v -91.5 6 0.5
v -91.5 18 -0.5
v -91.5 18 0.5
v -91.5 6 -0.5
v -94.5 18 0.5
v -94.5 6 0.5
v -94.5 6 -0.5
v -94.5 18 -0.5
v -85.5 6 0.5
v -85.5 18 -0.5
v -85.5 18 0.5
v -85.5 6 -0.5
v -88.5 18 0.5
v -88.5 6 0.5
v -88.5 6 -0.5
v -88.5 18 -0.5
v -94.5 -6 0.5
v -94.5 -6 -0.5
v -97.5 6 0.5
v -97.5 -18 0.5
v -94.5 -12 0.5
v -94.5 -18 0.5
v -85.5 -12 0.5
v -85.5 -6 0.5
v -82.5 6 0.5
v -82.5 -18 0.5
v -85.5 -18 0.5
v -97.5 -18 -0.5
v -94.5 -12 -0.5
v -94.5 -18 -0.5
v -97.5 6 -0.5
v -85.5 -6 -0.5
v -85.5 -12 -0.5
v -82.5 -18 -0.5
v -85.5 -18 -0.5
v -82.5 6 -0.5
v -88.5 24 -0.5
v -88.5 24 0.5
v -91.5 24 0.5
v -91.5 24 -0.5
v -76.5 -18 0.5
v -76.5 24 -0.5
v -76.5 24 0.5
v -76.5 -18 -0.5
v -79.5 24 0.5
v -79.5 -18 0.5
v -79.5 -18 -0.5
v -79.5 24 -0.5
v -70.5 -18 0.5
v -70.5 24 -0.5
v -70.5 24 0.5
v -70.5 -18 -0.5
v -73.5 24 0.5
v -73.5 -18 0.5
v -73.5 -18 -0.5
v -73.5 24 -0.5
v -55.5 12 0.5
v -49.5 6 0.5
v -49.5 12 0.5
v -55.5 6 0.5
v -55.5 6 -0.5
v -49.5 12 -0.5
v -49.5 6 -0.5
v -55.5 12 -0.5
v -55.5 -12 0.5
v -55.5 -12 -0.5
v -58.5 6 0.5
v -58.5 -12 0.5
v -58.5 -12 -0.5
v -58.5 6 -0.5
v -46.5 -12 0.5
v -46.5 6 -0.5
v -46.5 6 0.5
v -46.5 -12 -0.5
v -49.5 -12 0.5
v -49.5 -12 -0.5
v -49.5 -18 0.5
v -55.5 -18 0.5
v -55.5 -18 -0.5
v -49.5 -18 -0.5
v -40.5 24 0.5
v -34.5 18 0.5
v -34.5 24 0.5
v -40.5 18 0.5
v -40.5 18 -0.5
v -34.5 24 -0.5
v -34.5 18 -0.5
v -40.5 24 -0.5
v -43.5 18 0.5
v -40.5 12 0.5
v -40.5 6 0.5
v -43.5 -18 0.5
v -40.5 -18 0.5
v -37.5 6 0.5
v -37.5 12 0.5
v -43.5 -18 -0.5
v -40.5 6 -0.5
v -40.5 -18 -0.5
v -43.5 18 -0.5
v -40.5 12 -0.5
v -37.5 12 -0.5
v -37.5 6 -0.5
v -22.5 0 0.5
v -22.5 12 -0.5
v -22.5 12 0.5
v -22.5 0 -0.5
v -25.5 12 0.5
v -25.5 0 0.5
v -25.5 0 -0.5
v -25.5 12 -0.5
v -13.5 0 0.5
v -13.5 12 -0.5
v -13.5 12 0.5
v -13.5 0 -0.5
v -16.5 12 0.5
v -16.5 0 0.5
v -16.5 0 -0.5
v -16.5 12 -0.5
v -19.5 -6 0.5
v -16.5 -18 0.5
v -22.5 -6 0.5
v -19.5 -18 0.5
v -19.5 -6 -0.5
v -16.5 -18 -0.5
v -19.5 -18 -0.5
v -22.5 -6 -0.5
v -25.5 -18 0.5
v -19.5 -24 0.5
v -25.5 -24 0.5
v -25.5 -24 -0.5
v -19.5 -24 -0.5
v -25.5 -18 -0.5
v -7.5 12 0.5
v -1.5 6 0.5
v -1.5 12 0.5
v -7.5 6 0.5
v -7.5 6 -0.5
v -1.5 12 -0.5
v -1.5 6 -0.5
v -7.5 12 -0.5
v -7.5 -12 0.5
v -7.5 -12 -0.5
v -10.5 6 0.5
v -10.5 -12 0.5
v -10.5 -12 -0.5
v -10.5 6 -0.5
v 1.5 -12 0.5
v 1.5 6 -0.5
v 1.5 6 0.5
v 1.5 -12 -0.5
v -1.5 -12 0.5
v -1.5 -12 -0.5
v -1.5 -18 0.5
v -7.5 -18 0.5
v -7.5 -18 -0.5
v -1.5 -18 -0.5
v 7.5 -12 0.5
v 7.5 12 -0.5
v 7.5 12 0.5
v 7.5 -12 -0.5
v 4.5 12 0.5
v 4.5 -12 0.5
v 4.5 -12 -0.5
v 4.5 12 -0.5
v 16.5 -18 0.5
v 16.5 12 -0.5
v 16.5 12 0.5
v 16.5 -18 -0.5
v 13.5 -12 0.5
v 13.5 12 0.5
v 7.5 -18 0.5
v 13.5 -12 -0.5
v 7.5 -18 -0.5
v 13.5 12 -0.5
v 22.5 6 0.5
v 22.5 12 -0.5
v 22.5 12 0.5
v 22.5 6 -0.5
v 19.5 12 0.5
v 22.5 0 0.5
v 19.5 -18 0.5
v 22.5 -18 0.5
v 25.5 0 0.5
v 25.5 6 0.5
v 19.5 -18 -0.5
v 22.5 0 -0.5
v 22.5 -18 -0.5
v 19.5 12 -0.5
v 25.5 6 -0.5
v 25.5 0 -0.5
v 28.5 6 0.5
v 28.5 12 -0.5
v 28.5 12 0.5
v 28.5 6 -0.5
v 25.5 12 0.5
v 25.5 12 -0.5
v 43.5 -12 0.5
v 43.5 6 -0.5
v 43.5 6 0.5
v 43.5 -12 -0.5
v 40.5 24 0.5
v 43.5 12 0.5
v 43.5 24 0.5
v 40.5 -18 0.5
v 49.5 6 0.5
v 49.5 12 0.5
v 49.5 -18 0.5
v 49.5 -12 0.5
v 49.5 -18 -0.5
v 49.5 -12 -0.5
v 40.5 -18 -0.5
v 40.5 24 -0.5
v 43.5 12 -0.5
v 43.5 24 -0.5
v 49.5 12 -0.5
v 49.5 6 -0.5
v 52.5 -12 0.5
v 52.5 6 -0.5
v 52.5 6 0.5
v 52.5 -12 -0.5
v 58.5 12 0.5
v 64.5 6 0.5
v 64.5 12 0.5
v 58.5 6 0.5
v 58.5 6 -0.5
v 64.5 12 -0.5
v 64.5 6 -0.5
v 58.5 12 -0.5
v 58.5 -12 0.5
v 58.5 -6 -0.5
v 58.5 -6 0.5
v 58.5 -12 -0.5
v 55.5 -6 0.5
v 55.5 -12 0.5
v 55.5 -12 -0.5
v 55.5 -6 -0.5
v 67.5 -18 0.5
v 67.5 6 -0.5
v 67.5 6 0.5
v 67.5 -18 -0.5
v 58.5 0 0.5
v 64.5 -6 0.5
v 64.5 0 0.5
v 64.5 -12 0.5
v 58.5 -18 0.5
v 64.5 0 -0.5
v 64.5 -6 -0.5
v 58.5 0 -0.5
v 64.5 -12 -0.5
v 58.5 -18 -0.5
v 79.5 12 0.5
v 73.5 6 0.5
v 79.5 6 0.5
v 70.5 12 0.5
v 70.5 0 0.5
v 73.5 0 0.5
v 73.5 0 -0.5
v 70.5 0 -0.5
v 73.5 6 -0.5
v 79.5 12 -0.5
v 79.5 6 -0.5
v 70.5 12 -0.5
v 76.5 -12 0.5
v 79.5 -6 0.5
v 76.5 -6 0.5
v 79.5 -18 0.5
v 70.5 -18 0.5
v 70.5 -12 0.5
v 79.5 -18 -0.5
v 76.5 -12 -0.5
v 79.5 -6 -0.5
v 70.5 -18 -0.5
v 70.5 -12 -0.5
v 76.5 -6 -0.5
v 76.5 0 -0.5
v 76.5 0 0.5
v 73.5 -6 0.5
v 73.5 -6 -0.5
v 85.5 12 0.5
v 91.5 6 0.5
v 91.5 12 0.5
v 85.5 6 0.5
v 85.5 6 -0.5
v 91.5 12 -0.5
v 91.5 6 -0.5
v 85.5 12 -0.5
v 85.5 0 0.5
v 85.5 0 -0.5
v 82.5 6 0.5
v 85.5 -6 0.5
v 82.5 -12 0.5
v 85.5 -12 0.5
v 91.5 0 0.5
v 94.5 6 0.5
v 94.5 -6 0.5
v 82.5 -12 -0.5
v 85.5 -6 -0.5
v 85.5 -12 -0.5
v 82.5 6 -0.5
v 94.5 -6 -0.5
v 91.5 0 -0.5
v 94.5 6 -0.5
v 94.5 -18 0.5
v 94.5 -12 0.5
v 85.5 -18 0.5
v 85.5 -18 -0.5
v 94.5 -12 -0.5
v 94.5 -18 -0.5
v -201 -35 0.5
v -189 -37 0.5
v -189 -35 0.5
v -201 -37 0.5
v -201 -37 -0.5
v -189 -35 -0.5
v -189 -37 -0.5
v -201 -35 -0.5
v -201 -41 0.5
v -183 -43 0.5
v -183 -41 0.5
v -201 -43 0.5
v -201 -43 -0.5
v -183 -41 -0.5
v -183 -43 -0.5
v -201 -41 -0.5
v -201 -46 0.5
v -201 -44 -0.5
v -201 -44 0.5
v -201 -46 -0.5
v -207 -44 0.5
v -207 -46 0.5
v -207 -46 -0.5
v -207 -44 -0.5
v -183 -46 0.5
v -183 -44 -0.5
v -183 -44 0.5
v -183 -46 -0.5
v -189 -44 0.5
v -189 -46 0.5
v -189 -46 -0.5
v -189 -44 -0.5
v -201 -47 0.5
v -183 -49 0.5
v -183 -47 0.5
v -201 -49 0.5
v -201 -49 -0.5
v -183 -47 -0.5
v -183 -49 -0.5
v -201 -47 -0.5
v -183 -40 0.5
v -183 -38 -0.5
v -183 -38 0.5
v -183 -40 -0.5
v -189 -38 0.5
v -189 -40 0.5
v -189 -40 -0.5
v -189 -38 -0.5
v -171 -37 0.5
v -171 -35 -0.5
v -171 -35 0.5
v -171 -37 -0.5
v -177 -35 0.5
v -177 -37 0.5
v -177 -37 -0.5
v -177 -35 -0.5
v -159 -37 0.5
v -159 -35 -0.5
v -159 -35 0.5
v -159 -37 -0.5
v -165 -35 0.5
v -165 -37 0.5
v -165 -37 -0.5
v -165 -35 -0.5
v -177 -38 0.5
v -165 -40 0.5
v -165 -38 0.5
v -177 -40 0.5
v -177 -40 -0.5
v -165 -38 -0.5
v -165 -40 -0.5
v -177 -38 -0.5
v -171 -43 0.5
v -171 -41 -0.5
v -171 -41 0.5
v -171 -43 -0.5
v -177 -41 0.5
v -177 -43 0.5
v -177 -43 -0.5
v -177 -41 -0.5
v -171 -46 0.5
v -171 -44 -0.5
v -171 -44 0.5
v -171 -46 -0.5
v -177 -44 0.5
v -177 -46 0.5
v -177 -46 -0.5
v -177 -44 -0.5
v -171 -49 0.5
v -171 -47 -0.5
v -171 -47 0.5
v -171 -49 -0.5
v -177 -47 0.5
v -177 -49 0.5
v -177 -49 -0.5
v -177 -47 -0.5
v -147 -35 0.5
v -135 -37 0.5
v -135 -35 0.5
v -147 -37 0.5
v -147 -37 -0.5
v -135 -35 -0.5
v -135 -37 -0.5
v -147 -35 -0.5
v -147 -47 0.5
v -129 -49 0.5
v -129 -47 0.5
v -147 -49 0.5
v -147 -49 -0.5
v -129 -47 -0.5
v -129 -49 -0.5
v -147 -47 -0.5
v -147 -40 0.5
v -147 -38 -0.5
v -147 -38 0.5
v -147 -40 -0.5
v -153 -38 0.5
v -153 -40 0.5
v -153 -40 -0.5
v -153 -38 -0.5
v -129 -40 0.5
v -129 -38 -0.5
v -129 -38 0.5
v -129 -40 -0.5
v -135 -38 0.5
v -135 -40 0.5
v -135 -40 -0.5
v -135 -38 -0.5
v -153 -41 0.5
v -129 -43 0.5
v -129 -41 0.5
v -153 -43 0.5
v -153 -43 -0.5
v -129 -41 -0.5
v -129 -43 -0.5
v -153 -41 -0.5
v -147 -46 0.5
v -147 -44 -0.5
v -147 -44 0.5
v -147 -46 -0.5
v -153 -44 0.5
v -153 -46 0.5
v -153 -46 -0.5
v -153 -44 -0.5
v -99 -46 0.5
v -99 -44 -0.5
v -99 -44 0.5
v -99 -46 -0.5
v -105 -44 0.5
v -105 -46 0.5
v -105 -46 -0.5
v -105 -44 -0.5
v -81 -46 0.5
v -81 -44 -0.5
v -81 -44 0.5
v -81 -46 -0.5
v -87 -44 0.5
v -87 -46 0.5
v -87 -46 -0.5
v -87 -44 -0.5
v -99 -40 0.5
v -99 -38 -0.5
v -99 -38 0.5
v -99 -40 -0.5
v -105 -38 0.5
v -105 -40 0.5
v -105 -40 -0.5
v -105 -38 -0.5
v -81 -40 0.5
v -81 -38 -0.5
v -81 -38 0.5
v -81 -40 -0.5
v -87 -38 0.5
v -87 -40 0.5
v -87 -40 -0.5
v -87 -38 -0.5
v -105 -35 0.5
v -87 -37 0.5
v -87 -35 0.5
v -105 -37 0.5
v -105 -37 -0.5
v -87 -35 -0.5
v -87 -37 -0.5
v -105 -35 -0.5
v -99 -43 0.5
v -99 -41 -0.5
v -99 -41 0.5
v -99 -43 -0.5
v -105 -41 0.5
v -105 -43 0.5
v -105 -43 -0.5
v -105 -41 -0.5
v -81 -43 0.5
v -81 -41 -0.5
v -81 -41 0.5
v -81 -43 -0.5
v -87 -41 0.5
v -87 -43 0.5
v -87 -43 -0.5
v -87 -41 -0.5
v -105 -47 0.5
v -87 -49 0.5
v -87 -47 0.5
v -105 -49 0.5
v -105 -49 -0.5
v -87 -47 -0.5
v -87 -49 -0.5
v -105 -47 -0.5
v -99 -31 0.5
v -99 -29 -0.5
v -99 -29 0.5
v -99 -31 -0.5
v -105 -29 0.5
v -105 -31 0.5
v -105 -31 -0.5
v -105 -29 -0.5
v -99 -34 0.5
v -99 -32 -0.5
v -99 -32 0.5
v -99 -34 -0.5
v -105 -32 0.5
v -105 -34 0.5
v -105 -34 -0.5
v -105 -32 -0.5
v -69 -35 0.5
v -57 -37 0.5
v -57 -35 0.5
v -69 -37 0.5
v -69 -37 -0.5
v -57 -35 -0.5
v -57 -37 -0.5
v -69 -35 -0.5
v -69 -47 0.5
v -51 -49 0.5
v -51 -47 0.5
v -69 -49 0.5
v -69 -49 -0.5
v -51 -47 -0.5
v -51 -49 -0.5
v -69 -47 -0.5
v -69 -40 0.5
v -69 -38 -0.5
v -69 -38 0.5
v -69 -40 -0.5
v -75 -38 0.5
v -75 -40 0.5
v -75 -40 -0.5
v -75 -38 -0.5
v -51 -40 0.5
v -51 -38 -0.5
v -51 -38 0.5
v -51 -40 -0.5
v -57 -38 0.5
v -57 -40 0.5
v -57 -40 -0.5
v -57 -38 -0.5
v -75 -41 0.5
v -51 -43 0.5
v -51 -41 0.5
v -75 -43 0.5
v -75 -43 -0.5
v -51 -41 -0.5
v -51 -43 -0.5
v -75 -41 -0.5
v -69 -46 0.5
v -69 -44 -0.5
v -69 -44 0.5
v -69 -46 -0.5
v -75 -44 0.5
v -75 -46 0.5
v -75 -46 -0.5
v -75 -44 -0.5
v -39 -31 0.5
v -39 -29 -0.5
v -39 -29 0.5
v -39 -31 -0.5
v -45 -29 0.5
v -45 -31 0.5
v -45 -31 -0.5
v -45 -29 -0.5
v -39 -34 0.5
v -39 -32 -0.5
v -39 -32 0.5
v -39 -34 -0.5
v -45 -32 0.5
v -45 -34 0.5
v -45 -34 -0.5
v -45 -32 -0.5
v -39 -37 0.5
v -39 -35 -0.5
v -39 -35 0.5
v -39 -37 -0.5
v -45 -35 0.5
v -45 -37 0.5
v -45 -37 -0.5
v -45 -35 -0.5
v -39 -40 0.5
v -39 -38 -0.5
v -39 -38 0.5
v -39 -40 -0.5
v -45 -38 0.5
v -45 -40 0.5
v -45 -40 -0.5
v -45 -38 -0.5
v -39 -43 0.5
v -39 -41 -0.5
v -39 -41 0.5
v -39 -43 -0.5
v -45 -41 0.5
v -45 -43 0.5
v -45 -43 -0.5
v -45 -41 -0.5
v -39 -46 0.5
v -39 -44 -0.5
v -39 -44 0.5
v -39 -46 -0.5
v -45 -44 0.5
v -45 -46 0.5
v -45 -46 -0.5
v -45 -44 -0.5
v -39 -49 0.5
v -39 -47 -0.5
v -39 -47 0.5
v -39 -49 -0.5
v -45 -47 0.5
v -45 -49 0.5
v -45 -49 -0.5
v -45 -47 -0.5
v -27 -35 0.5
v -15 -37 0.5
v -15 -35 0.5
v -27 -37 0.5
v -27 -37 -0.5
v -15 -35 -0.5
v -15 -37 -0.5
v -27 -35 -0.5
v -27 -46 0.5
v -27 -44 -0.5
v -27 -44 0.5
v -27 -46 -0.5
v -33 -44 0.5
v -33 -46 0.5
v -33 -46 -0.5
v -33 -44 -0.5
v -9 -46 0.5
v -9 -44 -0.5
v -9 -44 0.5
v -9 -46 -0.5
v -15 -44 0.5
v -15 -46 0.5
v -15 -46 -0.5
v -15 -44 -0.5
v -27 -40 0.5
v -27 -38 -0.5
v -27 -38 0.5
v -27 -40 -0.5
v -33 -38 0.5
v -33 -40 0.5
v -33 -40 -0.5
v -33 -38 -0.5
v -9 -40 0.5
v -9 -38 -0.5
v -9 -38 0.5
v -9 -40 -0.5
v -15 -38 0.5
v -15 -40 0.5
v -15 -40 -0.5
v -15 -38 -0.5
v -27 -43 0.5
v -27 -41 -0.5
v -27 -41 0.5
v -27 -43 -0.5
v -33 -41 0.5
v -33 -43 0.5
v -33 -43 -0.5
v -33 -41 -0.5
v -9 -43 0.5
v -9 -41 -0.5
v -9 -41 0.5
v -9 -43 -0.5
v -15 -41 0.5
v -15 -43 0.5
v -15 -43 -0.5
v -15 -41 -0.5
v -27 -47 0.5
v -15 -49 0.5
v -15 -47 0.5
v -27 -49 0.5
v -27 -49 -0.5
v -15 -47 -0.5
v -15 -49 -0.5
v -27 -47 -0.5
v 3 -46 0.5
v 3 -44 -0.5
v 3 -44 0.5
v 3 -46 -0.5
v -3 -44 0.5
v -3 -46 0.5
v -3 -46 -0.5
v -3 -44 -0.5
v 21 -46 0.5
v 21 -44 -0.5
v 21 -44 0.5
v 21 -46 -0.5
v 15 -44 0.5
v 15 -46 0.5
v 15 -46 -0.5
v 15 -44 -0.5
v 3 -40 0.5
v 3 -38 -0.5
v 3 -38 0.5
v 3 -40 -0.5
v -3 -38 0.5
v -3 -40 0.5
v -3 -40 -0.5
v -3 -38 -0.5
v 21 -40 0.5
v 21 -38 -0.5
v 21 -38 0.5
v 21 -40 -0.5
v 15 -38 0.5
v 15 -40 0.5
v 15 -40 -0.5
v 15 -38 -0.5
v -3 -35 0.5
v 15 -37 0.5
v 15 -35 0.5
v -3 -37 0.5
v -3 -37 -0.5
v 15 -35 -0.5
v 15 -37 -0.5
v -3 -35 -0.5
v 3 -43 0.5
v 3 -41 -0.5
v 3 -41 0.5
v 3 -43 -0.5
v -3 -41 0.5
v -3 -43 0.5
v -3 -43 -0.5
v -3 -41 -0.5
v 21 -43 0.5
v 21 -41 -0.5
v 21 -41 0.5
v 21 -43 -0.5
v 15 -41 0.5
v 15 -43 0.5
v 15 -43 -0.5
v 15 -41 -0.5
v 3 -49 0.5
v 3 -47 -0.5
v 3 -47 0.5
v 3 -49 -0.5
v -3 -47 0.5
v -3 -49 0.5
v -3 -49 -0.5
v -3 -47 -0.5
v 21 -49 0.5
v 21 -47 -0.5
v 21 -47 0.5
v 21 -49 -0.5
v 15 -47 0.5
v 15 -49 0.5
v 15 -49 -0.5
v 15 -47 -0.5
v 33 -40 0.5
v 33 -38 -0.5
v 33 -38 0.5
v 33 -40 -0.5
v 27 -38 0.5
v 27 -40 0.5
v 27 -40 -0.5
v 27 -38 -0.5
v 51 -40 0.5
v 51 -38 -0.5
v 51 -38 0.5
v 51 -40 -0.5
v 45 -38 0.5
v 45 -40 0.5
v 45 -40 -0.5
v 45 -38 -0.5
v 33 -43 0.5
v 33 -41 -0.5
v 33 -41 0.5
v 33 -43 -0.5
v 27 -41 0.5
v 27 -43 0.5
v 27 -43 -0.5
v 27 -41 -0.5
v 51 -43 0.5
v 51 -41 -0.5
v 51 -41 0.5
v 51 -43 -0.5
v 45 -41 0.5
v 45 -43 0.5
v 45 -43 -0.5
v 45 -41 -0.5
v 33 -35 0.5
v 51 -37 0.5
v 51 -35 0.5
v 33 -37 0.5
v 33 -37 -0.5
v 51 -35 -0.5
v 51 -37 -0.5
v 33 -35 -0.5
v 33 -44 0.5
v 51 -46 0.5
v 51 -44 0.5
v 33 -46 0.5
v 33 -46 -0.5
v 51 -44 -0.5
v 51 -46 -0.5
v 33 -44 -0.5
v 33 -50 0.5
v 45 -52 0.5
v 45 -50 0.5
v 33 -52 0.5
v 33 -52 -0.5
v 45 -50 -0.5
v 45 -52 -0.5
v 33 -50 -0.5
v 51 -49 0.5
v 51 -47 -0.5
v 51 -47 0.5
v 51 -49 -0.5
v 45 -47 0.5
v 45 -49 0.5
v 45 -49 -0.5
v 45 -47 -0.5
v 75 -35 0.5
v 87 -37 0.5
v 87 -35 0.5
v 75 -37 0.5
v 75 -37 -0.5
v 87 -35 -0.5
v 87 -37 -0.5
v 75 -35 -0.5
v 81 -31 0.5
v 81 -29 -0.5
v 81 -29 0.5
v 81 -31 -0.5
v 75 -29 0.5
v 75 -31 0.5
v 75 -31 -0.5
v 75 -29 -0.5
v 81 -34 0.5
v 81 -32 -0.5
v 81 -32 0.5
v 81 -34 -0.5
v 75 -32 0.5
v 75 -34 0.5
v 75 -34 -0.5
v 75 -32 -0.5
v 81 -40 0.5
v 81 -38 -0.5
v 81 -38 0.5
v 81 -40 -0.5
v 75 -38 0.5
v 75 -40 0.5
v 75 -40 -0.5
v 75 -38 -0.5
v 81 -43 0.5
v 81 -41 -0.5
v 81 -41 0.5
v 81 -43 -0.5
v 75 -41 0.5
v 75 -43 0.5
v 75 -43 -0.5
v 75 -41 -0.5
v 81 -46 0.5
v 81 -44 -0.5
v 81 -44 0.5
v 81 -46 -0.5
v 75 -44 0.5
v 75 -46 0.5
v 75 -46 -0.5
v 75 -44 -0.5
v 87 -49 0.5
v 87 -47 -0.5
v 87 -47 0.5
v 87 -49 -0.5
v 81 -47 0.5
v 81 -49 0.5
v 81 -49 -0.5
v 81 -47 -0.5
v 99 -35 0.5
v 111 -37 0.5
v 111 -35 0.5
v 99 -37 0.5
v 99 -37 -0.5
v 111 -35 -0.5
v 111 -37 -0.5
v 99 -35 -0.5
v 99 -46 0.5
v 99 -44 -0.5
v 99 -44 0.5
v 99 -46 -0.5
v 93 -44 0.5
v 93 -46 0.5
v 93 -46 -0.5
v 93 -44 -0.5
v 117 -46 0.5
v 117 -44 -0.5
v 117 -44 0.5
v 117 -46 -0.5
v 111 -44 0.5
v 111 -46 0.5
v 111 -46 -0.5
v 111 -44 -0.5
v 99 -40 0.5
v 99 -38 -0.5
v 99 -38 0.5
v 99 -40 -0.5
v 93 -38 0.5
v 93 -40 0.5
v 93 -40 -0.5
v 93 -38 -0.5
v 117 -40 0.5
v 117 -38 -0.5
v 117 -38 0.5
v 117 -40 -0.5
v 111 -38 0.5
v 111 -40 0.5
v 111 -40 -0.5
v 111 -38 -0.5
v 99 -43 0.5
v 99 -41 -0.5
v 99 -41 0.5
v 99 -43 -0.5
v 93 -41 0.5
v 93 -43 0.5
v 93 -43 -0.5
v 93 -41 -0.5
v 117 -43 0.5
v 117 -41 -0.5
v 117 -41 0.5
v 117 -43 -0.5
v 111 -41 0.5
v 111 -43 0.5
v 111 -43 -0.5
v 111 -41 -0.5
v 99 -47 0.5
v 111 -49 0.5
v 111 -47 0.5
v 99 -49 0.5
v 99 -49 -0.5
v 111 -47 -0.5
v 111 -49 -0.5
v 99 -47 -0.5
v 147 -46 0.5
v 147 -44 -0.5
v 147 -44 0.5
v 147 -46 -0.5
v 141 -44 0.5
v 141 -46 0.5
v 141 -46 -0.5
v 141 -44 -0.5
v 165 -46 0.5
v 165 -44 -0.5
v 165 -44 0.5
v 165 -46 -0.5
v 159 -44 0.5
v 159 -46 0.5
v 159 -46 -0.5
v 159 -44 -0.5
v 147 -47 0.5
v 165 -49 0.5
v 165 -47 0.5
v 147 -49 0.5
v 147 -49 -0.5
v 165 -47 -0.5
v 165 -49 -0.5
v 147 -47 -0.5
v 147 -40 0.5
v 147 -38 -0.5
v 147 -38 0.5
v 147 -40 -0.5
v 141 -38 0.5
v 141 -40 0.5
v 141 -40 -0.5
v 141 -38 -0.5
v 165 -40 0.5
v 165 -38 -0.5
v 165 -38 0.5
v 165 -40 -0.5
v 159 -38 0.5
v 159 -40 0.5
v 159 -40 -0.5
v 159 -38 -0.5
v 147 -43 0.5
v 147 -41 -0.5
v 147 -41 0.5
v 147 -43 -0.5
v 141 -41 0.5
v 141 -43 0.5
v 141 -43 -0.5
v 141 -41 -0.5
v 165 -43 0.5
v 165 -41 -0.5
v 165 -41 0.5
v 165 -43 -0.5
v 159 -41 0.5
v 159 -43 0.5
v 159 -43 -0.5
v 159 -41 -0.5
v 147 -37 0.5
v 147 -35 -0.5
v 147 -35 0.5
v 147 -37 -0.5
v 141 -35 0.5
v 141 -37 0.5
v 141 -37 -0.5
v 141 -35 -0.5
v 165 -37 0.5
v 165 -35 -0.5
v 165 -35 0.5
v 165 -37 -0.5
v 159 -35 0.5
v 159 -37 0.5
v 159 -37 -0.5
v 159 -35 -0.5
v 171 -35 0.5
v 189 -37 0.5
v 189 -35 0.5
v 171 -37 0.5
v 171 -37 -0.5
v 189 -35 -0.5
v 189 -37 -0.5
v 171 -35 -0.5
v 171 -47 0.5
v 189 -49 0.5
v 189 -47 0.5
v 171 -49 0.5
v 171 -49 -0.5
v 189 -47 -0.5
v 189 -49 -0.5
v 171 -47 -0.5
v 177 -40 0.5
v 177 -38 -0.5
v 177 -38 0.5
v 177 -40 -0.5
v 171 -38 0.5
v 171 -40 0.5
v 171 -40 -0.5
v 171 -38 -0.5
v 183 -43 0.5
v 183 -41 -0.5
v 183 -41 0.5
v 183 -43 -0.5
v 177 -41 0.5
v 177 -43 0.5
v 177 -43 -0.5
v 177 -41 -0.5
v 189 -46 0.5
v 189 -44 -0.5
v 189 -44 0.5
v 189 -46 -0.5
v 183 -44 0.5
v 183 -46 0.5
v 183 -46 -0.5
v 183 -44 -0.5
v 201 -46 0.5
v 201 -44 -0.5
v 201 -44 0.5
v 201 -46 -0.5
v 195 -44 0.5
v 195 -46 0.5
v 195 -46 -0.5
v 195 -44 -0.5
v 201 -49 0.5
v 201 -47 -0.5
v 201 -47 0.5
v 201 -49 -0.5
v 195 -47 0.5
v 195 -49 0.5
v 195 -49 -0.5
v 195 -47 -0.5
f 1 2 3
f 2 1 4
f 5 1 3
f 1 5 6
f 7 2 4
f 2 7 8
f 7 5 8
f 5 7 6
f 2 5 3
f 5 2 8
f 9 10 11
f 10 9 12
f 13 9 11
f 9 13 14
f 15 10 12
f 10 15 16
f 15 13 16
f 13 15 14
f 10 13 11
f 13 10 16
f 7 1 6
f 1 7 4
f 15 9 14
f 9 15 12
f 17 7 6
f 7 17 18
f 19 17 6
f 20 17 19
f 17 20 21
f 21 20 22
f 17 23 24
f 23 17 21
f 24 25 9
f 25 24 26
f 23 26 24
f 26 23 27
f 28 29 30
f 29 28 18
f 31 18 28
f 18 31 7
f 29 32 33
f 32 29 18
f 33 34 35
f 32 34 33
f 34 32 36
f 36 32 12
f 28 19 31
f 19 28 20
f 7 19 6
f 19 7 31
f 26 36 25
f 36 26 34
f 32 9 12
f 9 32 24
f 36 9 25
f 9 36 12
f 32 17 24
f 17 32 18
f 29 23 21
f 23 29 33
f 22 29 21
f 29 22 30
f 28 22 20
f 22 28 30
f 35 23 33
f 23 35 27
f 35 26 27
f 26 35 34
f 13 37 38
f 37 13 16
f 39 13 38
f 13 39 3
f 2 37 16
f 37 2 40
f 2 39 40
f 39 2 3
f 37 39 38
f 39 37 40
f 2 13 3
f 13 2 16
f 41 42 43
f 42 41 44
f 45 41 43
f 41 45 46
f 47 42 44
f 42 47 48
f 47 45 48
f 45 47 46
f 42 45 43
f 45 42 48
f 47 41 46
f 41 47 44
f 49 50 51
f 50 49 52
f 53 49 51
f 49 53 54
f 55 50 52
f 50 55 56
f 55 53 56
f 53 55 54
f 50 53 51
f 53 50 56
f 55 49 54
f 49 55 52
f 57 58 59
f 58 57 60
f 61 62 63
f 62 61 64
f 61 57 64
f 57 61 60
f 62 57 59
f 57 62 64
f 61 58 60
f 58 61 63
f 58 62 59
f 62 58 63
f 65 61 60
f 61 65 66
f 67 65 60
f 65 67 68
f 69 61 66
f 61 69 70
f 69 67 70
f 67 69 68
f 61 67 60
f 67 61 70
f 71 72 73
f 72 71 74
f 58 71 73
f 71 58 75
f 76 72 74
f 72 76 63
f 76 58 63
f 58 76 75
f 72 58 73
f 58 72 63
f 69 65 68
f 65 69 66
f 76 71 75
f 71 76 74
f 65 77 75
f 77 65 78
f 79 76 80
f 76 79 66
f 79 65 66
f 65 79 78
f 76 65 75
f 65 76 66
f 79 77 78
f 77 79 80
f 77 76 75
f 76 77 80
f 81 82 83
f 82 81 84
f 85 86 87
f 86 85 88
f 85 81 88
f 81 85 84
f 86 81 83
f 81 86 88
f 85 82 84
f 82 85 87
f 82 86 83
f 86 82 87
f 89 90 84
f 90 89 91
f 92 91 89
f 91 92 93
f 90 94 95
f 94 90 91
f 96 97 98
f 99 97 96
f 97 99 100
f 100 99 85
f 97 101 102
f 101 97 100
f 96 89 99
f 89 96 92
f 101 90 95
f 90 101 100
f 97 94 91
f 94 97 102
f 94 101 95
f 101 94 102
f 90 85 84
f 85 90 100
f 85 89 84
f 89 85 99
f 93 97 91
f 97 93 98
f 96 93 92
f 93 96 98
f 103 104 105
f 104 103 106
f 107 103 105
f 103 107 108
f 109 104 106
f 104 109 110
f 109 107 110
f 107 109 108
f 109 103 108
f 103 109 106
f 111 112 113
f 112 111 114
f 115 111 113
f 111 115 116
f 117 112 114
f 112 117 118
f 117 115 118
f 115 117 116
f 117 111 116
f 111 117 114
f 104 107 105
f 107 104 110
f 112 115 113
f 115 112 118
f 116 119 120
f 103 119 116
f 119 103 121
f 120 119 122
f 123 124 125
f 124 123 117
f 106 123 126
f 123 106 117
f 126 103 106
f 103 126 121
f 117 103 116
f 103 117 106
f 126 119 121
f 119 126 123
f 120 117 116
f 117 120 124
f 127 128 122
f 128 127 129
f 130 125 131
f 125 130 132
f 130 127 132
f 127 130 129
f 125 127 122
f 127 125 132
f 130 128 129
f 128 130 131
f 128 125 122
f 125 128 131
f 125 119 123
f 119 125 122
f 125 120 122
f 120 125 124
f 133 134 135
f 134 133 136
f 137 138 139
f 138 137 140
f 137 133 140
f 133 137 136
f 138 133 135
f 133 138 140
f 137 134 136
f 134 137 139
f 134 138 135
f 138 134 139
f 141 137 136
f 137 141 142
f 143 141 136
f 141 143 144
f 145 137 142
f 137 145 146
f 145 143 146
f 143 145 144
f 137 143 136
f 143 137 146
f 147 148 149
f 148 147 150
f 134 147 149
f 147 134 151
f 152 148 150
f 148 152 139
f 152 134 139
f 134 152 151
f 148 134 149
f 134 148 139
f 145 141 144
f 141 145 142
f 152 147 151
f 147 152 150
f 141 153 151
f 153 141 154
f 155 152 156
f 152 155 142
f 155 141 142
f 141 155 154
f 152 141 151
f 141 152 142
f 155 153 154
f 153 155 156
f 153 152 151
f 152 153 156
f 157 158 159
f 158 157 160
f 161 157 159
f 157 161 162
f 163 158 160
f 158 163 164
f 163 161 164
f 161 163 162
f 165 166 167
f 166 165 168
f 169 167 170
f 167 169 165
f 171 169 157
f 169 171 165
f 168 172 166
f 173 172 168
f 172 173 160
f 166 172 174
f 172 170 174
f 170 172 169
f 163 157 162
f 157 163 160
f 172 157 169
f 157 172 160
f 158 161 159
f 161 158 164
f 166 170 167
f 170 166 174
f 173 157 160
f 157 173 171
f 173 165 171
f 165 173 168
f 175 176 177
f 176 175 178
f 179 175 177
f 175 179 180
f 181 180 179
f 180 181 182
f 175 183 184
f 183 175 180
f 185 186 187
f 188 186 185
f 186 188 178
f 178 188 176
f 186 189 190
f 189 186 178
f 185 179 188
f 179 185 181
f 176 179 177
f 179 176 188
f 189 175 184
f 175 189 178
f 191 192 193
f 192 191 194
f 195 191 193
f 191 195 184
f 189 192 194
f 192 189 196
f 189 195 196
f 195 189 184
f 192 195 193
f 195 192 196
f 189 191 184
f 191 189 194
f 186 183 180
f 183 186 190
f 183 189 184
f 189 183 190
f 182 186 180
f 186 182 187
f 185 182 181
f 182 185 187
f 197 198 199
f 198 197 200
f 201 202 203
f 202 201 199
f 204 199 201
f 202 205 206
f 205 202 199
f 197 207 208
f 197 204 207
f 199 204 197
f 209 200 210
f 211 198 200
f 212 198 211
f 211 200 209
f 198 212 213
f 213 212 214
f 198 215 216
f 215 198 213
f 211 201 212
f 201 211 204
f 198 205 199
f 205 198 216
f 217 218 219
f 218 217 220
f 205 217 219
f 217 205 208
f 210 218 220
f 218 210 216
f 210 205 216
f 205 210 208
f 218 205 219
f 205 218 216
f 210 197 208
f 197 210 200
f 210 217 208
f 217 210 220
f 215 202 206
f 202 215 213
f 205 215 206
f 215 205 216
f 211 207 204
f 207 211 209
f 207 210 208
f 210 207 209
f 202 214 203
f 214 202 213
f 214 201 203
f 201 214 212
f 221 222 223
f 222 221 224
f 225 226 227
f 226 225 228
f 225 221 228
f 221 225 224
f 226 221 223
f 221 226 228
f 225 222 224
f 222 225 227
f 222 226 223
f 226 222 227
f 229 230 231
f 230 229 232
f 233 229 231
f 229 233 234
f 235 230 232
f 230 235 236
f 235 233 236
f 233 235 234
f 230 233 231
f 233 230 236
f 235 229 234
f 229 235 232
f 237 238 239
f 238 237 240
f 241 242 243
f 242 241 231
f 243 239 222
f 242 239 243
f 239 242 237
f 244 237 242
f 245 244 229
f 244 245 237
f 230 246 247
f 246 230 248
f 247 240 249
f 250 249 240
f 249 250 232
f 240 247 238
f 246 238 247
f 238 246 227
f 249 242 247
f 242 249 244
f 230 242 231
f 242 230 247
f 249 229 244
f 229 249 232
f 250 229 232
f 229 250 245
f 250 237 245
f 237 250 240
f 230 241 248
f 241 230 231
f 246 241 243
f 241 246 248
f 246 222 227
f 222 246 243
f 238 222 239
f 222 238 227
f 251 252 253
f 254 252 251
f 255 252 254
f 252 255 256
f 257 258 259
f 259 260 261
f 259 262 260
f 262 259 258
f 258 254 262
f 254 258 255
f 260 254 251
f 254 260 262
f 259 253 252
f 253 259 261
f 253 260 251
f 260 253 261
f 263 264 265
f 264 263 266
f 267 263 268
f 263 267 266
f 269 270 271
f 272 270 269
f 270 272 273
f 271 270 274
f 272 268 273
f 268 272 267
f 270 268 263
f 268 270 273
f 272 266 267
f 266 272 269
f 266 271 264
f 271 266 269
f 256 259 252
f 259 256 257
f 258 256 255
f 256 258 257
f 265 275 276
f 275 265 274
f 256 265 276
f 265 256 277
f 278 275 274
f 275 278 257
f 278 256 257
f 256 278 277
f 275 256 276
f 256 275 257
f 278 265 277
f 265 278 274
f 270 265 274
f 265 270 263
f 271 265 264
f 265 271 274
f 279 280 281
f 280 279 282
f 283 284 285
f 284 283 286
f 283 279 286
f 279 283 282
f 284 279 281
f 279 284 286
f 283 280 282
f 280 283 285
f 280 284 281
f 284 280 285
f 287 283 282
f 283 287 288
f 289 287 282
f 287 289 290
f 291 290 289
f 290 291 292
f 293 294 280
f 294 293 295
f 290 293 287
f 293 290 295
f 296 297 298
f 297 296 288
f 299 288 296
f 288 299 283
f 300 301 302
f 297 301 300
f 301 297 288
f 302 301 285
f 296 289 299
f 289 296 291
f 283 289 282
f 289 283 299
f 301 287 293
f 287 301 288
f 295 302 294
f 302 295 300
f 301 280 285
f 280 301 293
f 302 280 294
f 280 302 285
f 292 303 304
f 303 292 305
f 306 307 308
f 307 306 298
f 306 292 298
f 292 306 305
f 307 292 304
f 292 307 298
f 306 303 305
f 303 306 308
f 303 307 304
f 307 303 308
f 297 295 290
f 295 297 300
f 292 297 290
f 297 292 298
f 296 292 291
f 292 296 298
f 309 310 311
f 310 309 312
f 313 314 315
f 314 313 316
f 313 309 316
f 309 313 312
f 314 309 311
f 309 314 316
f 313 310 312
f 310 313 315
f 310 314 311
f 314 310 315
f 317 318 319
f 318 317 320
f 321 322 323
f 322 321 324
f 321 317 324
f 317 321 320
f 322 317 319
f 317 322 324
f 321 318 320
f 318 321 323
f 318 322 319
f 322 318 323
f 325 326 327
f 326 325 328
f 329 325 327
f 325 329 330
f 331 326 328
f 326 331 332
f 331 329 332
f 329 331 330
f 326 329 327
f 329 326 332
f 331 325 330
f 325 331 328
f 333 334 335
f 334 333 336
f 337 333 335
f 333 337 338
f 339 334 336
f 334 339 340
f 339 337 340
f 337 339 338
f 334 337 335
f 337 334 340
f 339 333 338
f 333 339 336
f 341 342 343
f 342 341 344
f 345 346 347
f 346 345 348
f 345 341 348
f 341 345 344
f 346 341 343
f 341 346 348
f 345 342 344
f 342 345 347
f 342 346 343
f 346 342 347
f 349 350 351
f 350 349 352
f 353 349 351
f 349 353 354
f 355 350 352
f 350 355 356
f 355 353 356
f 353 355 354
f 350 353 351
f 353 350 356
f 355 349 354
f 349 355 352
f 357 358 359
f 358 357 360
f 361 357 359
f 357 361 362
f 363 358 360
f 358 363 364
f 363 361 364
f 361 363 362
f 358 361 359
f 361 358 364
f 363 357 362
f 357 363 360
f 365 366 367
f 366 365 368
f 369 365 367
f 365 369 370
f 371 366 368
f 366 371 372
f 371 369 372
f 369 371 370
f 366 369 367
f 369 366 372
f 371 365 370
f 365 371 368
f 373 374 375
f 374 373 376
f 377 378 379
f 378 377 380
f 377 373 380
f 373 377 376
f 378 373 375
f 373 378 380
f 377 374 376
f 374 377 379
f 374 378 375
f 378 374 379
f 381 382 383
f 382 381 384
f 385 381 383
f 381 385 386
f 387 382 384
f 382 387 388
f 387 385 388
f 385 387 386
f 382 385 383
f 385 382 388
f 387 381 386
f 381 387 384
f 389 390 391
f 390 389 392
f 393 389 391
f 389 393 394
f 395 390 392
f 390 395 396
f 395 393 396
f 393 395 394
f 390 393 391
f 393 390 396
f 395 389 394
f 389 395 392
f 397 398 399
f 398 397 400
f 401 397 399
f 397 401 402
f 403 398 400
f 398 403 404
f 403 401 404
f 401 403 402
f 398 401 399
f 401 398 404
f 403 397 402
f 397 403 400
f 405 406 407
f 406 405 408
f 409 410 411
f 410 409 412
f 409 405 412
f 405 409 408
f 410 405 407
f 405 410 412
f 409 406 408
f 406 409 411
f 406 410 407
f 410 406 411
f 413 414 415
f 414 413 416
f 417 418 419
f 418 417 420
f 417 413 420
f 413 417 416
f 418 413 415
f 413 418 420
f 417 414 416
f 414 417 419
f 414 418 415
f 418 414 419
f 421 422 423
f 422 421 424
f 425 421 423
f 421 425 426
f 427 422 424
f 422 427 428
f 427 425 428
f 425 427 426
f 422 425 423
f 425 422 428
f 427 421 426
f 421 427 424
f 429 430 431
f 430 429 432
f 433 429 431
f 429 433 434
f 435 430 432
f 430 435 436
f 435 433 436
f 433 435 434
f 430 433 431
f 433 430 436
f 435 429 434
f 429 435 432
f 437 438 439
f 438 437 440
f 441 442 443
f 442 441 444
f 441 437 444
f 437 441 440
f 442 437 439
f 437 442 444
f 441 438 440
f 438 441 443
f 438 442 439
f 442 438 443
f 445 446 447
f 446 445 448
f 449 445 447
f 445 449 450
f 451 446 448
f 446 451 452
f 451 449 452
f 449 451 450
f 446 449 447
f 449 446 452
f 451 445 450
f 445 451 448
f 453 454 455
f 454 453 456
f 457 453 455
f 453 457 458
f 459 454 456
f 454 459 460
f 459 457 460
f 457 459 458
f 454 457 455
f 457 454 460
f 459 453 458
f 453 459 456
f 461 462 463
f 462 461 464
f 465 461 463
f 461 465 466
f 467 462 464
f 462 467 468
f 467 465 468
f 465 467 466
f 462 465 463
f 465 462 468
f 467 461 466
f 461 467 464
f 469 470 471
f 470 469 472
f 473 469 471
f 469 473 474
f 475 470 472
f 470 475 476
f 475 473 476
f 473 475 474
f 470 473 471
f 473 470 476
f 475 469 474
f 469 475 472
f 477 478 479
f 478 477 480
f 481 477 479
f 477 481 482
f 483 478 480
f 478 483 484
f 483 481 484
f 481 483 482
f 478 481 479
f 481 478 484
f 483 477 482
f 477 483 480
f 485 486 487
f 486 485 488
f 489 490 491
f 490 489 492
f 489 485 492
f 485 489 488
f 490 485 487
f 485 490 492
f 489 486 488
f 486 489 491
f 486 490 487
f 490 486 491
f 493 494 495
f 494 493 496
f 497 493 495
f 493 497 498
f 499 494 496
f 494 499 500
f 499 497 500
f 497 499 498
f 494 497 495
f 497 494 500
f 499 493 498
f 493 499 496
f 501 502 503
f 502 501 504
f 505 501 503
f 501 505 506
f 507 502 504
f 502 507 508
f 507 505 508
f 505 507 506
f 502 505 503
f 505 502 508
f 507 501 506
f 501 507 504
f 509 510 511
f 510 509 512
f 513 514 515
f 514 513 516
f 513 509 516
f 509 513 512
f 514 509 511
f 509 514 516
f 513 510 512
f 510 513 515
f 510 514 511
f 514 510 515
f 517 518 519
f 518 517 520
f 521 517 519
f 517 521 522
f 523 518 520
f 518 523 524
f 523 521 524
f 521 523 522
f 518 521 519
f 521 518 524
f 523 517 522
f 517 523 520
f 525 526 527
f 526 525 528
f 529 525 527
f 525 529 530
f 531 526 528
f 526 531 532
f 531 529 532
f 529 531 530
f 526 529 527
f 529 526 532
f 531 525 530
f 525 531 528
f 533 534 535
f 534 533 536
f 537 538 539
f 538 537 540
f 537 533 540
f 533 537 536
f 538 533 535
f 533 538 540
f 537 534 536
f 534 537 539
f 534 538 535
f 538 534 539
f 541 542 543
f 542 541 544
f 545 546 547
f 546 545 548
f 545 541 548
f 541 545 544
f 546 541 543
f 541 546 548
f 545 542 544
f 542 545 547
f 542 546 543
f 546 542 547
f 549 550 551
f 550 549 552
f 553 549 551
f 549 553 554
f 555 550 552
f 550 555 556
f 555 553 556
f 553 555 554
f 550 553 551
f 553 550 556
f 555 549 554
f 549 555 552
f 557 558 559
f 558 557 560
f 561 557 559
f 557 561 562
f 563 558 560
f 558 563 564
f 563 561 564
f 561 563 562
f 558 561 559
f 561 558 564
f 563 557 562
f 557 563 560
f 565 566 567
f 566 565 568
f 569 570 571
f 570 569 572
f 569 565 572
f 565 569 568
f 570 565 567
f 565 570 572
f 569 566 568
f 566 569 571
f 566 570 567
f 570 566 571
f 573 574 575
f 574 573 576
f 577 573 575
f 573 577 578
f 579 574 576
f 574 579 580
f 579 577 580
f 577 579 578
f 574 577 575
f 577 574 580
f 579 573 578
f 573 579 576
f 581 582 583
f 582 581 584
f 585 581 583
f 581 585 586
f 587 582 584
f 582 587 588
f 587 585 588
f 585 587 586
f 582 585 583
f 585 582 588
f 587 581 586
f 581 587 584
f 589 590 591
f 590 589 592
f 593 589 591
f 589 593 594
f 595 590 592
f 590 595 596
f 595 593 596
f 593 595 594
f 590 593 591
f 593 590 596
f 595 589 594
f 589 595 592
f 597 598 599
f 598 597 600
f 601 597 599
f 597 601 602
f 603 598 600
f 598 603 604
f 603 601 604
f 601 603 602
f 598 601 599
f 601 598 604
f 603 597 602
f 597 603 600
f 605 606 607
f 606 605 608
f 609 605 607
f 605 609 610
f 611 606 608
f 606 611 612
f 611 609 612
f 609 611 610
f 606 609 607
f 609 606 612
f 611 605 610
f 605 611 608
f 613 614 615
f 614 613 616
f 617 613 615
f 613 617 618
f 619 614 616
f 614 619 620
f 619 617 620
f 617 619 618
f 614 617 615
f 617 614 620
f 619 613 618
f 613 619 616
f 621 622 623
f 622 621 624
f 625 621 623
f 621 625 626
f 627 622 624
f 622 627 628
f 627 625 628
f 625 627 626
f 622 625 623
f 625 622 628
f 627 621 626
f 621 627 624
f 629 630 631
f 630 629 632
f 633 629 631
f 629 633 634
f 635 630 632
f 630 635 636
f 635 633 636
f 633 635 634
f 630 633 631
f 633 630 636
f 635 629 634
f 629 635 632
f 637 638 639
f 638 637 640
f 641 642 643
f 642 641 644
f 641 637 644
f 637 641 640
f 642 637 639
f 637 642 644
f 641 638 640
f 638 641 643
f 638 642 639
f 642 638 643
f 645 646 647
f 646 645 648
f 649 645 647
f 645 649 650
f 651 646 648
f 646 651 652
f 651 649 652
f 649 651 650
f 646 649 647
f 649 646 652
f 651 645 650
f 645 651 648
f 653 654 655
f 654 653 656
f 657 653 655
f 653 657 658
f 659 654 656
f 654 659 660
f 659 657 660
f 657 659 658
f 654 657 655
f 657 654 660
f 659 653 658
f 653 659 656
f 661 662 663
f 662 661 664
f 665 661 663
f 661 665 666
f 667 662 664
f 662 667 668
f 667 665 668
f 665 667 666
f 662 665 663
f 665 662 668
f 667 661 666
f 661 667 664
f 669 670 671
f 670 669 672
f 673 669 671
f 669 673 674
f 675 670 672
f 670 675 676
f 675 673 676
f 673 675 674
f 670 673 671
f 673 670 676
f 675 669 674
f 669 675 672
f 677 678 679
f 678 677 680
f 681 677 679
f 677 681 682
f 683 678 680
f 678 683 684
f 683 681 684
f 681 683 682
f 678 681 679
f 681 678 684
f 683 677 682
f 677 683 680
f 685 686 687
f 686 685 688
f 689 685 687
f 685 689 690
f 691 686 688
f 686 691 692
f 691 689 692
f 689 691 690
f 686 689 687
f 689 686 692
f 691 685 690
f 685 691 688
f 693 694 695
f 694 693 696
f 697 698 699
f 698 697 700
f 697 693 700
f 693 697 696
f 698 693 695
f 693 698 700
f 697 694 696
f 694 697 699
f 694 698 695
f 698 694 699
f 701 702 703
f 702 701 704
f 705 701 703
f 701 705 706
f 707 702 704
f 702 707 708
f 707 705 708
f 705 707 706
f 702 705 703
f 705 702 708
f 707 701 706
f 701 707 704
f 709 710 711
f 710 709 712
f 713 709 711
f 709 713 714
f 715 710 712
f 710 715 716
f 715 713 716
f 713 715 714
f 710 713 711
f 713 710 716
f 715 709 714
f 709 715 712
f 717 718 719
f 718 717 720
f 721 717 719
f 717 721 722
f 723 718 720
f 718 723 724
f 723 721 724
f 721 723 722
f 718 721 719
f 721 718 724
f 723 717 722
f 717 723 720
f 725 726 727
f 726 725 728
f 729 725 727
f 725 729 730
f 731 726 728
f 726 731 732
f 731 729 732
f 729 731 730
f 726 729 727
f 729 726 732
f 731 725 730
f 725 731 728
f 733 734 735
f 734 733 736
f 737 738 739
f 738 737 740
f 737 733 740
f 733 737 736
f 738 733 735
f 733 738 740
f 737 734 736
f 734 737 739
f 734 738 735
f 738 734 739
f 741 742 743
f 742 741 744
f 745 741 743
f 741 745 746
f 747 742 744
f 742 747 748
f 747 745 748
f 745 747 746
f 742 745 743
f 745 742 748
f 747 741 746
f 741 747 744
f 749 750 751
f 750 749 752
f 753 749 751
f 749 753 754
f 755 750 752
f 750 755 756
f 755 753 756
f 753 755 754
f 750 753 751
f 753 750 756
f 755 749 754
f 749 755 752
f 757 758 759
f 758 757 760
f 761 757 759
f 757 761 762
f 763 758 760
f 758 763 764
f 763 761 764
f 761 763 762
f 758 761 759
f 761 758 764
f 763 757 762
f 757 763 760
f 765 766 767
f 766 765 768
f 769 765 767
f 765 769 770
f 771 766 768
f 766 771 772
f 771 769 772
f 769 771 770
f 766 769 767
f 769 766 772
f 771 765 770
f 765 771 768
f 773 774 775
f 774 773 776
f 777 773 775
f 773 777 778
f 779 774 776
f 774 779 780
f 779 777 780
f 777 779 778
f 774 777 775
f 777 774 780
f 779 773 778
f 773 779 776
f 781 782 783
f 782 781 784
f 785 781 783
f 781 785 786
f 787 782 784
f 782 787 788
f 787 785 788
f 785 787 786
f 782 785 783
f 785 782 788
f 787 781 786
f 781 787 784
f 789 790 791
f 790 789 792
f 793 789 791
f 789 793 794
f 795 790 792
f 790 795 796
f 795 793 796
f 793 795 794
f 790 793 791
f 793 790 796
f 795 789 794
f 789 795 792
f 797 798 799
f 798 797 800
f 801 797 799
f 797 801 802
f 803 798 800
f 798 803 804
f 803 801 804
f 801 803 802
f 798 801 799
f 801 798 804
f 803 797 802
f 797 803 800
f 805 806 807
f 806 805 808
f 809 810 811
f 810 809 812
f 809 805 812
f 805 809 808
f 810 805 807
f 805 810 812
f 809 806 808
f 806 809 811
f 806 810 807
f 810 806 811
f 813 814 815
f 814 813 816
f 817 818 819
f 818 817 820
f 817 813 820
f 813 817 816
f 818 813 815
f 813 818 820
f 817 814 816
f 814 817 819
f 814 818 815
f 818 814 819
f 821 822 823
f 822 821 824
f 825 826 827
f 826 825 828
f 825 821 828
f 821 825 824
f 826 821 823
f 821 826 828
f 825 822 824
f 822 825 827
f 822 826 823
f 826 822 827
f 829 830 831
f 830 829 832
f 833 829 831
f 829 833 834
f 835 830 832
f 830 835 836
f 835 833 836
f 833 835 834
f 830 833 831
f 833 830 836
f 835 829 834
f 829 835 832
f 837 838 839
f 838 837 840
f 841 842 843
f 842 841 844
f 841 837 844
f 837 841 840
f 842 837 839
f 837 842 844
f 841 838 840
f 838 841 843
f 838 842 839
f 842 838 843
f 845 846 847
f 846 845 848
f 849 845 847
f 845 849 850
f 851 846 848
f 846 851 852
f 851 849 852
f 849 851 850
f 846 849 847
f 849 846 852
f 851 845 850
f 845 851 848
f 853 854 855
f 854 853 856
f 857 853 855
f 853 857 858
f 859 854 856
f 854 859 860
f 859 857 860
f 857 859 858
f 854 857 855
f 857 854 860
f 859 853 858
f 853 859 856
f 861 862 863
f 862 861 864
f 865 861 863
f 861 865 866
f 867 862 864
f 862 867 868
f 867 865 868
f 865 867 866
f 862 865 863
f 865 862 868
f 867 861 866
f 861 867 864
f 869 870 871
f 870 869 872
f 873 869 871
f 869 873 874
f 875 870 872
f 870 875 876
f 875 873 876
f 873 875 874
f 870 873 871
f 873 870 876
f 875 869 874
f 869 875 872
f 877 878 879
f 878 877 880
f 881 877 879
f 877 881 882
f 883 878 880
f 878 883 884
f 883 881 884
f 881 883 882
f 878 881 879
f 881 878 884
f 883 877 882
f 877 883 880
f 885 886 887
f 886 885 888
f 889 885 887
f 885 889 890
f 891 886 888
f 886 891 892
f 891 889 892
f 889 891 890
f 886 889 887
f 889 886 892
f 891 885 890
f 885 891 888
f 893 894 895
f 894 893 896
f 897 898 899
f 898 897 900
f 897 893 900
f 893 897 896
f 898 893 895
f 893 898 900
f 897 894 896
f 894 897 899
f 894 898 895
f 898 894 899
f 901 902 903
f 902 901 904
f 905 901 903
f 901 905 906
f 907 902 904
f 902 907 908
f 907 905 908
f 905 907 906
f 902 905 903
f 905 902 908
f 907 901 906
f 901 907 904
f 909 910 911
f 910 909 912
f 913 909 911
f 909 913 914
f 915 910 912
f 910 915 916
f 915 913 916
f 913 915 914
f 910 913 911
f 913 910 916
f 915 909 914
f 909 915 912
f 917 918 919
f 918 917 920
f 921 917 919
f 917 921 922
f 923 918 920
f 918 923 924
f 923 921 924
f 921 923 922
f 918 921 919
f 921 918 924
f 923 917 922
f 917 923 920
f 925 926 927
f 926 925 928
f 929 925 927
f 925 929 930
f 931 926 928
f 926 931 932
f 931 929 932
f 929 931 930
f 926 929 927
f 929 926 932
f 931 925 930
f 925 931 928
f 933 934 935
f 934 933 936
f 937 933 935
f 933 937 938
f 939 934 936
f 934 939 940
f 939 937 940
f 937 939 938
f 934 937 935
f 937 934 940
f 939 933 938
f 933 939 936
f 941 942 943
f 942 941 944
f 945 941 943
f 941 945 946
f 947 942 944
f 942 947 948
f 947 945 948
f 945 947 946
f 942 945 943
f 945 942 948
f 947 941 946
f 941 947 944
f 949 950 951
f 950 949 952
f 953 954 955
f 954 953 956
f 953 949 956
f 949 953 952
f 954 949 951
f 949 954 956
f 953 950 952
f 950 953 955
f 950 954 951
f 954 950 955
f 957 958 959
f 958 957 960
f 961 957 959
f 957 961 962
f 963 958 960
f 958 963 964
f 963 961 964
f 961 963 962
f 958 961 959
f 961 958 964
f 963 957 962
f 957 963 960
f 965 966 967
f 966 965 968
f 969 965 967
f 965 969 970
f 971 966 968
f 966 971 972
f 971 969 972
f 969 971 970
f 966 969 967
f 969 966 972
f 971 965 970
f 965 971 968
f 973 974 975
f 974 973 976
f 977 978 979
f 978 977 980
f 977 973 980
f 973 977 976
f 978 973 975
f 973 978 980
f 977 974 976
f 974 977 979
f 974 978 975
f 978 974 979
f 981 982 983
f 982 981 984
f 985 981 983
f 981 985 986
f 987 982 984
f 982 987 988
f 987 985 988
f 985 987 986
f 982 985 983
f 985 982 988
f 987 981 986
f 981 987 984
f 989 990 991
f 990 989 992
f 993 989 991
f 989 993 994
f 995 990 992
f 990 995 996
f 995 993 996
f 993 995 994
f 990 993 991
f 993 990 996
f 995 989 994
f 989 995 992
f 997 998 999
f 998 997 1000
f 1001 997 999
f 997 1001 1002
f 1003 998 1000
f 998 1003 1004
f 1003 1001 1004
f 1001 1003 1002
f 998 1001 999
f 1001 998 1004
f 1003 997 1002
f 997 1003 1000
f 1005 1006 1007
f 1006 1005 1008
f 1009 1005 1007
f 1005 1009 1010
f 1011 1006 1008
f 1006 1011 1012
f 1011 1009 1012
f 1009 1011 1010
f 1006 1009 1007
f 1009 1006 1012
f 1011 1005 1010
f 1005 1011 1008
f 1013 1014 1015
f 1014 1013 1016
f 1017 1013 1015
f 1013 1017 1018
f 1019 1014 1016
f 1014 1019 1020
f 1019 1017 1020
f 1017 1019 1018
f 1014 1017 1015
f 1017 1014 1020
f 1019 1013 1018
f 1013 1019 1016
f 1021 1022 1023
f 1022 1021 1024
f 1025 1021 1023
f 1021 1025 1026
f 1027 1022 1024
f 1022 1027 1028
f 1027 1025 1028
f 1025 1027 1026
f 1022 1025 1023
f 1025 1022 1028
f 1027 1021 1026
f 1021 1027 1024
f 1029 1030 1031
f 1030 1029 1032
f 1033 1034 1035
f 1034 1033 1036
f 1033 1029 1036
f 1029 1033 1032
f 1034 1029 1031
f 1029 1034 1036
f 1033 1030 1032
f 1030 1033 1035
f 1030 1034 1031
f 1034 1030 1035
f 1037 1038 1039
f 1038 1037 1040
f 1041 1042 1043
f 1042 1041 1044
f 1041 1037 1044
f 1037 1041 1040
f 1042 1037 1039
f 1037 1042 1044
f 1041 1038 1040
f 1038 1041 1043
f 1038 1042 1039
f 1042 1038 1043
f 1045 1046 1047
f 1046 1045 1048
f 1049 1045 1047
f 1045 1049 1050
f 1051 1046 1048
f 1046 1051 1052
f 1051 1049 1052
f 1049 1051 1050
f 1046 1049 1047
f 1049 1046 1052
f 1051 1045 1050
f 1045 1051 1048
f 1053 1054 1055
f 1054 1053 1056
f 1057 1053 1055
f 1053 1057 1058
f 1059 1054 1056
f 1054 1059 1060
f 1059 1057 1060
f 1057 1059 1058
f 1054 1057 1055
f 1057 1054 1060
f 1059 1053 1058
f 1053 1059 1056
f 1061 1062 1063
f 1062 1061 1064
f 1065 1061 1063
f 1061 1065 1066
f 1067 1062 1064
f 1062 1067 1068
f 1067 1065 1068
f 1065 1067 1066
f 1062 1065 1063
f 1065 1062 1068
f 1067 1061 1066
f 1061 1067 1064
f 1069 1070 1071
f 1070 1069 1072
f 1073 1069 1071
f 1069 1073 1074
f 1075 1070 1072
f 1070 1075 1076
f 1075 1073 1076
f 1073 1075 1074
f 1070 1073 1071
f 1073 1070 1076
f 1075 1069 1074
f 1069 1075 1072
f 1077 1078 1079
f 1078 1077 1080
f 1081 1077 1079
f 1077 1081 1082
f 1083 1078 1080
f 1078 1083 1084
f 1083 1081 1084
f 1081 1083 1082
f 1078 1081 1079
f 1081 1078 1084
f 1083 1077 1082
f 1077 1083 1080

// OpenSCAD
// file: ../writer.scad
/*
_ascii = " !\"#$%&'()*+,-./0123456789:;<=>?@ABCDEFGHIJKLMNOPQRSTUVWXYZ[\\]^_`abcdefghijklmnopqrstuvwxyz{|}~";
_ansi = "€ ‚ƒ„…†‡ˆ‰Š‹Œ Ž  ‘’“”•–—˜™š›œ žŸ ¡¢£¤¥¦§¨©«¬ ®¯°±²³´µ¶·¸¹º»¼½¾¿ÀÁÂÃÄÅÆÇÈÉÊËÌÍÎÏÐÑÒÓÔÕÖ×ØÙÚÛÜÝÞßàáâãäåæçèéêëìíîïðñòóôõö÷øùúûüýþÿ";

*/
// to do: define fallback character


module write(text,font,size=[10,10,1] , center=false , pixel_signifier = "1" , fallback_char = "?" ) {
	matrix = charmatrix( text[0] , font , fallback_char );
	font_height = len(matrix); 
	
	move = center ? [-textwidth( text, font, fallback_char = fallback_char ) * size[0]/2 , -font_height*size[1]/2 , -size[2]/2 ] : [0,0,0];
	translate(move)
		for ( i = [0:len(text)-1] ) {
			translate([charpos( text , i , font , fallback_char = fallback_char )*size[0],0,0])
				draw_char(text[i],font,size,pixel_signifier,fallback_char)
					if ( $children > 0 ) {
						children();
					} else {
						cube(size);
					}
		}
}

module draw_char( char , font , size=[10,10] , pixel_signifier = "1" , fallback_char = "?" ) {
	matrix = charmatrix(char , font , fallback_char );
	font_height = len(matrix); 
	union() {
		for ( y = [0:len(matrix)-1] ) 
			for ( x = [0:charwidth( char , font , fallback_char )-1] ) {
			
				if ( matrix[y][x] == pixel_signifier )
					translate([x*size[0],(font_height-y-1)*size[1],0])
						children();
			}
	}
}


function charstruct( char , font , fallback_char = "?" ) 
	= ( (font[ search( [char] , font )[0] ] == undef) ? charstruct(fallback_char,font) : font[ search( [char] , font )[0] ] );
	
function charmatrix( char , font , fallback_char = "?" ) 
	= charstruct( char , font , fallback_char )[1];
	
function charwidth( char , font , fallback_char = "?" ) 
	= len(charmatrix( char , font , fallback_char )[0]);
	
function charpos( text , index , font , pos=0 , fallback_char = "?" ) 
	= ( index==0 ? pos : charpos( text , index-1 , font , pos + charwidth( text[index-1] , font , fallback_char ) , fallback_char ) );

// return pixel width of text
function textwidth( text , font , width = 0 , index = 0 , fallback_char = "?" ) 
	= ( index==len(text) ? width : textwidth( text , font , width + charwidth( text[index] , font , fallback_char ) , index+1) );
// main file
use <../writer.scad>;
include <../fonts/default_font.scad>;

write("All of your base",default_font,size=[3,6,1],center=true);

translate([0,-40,0])
	write("are belong to us.",default_font,size=[6,3,1],center=true)
		cube([6,2,1]);
